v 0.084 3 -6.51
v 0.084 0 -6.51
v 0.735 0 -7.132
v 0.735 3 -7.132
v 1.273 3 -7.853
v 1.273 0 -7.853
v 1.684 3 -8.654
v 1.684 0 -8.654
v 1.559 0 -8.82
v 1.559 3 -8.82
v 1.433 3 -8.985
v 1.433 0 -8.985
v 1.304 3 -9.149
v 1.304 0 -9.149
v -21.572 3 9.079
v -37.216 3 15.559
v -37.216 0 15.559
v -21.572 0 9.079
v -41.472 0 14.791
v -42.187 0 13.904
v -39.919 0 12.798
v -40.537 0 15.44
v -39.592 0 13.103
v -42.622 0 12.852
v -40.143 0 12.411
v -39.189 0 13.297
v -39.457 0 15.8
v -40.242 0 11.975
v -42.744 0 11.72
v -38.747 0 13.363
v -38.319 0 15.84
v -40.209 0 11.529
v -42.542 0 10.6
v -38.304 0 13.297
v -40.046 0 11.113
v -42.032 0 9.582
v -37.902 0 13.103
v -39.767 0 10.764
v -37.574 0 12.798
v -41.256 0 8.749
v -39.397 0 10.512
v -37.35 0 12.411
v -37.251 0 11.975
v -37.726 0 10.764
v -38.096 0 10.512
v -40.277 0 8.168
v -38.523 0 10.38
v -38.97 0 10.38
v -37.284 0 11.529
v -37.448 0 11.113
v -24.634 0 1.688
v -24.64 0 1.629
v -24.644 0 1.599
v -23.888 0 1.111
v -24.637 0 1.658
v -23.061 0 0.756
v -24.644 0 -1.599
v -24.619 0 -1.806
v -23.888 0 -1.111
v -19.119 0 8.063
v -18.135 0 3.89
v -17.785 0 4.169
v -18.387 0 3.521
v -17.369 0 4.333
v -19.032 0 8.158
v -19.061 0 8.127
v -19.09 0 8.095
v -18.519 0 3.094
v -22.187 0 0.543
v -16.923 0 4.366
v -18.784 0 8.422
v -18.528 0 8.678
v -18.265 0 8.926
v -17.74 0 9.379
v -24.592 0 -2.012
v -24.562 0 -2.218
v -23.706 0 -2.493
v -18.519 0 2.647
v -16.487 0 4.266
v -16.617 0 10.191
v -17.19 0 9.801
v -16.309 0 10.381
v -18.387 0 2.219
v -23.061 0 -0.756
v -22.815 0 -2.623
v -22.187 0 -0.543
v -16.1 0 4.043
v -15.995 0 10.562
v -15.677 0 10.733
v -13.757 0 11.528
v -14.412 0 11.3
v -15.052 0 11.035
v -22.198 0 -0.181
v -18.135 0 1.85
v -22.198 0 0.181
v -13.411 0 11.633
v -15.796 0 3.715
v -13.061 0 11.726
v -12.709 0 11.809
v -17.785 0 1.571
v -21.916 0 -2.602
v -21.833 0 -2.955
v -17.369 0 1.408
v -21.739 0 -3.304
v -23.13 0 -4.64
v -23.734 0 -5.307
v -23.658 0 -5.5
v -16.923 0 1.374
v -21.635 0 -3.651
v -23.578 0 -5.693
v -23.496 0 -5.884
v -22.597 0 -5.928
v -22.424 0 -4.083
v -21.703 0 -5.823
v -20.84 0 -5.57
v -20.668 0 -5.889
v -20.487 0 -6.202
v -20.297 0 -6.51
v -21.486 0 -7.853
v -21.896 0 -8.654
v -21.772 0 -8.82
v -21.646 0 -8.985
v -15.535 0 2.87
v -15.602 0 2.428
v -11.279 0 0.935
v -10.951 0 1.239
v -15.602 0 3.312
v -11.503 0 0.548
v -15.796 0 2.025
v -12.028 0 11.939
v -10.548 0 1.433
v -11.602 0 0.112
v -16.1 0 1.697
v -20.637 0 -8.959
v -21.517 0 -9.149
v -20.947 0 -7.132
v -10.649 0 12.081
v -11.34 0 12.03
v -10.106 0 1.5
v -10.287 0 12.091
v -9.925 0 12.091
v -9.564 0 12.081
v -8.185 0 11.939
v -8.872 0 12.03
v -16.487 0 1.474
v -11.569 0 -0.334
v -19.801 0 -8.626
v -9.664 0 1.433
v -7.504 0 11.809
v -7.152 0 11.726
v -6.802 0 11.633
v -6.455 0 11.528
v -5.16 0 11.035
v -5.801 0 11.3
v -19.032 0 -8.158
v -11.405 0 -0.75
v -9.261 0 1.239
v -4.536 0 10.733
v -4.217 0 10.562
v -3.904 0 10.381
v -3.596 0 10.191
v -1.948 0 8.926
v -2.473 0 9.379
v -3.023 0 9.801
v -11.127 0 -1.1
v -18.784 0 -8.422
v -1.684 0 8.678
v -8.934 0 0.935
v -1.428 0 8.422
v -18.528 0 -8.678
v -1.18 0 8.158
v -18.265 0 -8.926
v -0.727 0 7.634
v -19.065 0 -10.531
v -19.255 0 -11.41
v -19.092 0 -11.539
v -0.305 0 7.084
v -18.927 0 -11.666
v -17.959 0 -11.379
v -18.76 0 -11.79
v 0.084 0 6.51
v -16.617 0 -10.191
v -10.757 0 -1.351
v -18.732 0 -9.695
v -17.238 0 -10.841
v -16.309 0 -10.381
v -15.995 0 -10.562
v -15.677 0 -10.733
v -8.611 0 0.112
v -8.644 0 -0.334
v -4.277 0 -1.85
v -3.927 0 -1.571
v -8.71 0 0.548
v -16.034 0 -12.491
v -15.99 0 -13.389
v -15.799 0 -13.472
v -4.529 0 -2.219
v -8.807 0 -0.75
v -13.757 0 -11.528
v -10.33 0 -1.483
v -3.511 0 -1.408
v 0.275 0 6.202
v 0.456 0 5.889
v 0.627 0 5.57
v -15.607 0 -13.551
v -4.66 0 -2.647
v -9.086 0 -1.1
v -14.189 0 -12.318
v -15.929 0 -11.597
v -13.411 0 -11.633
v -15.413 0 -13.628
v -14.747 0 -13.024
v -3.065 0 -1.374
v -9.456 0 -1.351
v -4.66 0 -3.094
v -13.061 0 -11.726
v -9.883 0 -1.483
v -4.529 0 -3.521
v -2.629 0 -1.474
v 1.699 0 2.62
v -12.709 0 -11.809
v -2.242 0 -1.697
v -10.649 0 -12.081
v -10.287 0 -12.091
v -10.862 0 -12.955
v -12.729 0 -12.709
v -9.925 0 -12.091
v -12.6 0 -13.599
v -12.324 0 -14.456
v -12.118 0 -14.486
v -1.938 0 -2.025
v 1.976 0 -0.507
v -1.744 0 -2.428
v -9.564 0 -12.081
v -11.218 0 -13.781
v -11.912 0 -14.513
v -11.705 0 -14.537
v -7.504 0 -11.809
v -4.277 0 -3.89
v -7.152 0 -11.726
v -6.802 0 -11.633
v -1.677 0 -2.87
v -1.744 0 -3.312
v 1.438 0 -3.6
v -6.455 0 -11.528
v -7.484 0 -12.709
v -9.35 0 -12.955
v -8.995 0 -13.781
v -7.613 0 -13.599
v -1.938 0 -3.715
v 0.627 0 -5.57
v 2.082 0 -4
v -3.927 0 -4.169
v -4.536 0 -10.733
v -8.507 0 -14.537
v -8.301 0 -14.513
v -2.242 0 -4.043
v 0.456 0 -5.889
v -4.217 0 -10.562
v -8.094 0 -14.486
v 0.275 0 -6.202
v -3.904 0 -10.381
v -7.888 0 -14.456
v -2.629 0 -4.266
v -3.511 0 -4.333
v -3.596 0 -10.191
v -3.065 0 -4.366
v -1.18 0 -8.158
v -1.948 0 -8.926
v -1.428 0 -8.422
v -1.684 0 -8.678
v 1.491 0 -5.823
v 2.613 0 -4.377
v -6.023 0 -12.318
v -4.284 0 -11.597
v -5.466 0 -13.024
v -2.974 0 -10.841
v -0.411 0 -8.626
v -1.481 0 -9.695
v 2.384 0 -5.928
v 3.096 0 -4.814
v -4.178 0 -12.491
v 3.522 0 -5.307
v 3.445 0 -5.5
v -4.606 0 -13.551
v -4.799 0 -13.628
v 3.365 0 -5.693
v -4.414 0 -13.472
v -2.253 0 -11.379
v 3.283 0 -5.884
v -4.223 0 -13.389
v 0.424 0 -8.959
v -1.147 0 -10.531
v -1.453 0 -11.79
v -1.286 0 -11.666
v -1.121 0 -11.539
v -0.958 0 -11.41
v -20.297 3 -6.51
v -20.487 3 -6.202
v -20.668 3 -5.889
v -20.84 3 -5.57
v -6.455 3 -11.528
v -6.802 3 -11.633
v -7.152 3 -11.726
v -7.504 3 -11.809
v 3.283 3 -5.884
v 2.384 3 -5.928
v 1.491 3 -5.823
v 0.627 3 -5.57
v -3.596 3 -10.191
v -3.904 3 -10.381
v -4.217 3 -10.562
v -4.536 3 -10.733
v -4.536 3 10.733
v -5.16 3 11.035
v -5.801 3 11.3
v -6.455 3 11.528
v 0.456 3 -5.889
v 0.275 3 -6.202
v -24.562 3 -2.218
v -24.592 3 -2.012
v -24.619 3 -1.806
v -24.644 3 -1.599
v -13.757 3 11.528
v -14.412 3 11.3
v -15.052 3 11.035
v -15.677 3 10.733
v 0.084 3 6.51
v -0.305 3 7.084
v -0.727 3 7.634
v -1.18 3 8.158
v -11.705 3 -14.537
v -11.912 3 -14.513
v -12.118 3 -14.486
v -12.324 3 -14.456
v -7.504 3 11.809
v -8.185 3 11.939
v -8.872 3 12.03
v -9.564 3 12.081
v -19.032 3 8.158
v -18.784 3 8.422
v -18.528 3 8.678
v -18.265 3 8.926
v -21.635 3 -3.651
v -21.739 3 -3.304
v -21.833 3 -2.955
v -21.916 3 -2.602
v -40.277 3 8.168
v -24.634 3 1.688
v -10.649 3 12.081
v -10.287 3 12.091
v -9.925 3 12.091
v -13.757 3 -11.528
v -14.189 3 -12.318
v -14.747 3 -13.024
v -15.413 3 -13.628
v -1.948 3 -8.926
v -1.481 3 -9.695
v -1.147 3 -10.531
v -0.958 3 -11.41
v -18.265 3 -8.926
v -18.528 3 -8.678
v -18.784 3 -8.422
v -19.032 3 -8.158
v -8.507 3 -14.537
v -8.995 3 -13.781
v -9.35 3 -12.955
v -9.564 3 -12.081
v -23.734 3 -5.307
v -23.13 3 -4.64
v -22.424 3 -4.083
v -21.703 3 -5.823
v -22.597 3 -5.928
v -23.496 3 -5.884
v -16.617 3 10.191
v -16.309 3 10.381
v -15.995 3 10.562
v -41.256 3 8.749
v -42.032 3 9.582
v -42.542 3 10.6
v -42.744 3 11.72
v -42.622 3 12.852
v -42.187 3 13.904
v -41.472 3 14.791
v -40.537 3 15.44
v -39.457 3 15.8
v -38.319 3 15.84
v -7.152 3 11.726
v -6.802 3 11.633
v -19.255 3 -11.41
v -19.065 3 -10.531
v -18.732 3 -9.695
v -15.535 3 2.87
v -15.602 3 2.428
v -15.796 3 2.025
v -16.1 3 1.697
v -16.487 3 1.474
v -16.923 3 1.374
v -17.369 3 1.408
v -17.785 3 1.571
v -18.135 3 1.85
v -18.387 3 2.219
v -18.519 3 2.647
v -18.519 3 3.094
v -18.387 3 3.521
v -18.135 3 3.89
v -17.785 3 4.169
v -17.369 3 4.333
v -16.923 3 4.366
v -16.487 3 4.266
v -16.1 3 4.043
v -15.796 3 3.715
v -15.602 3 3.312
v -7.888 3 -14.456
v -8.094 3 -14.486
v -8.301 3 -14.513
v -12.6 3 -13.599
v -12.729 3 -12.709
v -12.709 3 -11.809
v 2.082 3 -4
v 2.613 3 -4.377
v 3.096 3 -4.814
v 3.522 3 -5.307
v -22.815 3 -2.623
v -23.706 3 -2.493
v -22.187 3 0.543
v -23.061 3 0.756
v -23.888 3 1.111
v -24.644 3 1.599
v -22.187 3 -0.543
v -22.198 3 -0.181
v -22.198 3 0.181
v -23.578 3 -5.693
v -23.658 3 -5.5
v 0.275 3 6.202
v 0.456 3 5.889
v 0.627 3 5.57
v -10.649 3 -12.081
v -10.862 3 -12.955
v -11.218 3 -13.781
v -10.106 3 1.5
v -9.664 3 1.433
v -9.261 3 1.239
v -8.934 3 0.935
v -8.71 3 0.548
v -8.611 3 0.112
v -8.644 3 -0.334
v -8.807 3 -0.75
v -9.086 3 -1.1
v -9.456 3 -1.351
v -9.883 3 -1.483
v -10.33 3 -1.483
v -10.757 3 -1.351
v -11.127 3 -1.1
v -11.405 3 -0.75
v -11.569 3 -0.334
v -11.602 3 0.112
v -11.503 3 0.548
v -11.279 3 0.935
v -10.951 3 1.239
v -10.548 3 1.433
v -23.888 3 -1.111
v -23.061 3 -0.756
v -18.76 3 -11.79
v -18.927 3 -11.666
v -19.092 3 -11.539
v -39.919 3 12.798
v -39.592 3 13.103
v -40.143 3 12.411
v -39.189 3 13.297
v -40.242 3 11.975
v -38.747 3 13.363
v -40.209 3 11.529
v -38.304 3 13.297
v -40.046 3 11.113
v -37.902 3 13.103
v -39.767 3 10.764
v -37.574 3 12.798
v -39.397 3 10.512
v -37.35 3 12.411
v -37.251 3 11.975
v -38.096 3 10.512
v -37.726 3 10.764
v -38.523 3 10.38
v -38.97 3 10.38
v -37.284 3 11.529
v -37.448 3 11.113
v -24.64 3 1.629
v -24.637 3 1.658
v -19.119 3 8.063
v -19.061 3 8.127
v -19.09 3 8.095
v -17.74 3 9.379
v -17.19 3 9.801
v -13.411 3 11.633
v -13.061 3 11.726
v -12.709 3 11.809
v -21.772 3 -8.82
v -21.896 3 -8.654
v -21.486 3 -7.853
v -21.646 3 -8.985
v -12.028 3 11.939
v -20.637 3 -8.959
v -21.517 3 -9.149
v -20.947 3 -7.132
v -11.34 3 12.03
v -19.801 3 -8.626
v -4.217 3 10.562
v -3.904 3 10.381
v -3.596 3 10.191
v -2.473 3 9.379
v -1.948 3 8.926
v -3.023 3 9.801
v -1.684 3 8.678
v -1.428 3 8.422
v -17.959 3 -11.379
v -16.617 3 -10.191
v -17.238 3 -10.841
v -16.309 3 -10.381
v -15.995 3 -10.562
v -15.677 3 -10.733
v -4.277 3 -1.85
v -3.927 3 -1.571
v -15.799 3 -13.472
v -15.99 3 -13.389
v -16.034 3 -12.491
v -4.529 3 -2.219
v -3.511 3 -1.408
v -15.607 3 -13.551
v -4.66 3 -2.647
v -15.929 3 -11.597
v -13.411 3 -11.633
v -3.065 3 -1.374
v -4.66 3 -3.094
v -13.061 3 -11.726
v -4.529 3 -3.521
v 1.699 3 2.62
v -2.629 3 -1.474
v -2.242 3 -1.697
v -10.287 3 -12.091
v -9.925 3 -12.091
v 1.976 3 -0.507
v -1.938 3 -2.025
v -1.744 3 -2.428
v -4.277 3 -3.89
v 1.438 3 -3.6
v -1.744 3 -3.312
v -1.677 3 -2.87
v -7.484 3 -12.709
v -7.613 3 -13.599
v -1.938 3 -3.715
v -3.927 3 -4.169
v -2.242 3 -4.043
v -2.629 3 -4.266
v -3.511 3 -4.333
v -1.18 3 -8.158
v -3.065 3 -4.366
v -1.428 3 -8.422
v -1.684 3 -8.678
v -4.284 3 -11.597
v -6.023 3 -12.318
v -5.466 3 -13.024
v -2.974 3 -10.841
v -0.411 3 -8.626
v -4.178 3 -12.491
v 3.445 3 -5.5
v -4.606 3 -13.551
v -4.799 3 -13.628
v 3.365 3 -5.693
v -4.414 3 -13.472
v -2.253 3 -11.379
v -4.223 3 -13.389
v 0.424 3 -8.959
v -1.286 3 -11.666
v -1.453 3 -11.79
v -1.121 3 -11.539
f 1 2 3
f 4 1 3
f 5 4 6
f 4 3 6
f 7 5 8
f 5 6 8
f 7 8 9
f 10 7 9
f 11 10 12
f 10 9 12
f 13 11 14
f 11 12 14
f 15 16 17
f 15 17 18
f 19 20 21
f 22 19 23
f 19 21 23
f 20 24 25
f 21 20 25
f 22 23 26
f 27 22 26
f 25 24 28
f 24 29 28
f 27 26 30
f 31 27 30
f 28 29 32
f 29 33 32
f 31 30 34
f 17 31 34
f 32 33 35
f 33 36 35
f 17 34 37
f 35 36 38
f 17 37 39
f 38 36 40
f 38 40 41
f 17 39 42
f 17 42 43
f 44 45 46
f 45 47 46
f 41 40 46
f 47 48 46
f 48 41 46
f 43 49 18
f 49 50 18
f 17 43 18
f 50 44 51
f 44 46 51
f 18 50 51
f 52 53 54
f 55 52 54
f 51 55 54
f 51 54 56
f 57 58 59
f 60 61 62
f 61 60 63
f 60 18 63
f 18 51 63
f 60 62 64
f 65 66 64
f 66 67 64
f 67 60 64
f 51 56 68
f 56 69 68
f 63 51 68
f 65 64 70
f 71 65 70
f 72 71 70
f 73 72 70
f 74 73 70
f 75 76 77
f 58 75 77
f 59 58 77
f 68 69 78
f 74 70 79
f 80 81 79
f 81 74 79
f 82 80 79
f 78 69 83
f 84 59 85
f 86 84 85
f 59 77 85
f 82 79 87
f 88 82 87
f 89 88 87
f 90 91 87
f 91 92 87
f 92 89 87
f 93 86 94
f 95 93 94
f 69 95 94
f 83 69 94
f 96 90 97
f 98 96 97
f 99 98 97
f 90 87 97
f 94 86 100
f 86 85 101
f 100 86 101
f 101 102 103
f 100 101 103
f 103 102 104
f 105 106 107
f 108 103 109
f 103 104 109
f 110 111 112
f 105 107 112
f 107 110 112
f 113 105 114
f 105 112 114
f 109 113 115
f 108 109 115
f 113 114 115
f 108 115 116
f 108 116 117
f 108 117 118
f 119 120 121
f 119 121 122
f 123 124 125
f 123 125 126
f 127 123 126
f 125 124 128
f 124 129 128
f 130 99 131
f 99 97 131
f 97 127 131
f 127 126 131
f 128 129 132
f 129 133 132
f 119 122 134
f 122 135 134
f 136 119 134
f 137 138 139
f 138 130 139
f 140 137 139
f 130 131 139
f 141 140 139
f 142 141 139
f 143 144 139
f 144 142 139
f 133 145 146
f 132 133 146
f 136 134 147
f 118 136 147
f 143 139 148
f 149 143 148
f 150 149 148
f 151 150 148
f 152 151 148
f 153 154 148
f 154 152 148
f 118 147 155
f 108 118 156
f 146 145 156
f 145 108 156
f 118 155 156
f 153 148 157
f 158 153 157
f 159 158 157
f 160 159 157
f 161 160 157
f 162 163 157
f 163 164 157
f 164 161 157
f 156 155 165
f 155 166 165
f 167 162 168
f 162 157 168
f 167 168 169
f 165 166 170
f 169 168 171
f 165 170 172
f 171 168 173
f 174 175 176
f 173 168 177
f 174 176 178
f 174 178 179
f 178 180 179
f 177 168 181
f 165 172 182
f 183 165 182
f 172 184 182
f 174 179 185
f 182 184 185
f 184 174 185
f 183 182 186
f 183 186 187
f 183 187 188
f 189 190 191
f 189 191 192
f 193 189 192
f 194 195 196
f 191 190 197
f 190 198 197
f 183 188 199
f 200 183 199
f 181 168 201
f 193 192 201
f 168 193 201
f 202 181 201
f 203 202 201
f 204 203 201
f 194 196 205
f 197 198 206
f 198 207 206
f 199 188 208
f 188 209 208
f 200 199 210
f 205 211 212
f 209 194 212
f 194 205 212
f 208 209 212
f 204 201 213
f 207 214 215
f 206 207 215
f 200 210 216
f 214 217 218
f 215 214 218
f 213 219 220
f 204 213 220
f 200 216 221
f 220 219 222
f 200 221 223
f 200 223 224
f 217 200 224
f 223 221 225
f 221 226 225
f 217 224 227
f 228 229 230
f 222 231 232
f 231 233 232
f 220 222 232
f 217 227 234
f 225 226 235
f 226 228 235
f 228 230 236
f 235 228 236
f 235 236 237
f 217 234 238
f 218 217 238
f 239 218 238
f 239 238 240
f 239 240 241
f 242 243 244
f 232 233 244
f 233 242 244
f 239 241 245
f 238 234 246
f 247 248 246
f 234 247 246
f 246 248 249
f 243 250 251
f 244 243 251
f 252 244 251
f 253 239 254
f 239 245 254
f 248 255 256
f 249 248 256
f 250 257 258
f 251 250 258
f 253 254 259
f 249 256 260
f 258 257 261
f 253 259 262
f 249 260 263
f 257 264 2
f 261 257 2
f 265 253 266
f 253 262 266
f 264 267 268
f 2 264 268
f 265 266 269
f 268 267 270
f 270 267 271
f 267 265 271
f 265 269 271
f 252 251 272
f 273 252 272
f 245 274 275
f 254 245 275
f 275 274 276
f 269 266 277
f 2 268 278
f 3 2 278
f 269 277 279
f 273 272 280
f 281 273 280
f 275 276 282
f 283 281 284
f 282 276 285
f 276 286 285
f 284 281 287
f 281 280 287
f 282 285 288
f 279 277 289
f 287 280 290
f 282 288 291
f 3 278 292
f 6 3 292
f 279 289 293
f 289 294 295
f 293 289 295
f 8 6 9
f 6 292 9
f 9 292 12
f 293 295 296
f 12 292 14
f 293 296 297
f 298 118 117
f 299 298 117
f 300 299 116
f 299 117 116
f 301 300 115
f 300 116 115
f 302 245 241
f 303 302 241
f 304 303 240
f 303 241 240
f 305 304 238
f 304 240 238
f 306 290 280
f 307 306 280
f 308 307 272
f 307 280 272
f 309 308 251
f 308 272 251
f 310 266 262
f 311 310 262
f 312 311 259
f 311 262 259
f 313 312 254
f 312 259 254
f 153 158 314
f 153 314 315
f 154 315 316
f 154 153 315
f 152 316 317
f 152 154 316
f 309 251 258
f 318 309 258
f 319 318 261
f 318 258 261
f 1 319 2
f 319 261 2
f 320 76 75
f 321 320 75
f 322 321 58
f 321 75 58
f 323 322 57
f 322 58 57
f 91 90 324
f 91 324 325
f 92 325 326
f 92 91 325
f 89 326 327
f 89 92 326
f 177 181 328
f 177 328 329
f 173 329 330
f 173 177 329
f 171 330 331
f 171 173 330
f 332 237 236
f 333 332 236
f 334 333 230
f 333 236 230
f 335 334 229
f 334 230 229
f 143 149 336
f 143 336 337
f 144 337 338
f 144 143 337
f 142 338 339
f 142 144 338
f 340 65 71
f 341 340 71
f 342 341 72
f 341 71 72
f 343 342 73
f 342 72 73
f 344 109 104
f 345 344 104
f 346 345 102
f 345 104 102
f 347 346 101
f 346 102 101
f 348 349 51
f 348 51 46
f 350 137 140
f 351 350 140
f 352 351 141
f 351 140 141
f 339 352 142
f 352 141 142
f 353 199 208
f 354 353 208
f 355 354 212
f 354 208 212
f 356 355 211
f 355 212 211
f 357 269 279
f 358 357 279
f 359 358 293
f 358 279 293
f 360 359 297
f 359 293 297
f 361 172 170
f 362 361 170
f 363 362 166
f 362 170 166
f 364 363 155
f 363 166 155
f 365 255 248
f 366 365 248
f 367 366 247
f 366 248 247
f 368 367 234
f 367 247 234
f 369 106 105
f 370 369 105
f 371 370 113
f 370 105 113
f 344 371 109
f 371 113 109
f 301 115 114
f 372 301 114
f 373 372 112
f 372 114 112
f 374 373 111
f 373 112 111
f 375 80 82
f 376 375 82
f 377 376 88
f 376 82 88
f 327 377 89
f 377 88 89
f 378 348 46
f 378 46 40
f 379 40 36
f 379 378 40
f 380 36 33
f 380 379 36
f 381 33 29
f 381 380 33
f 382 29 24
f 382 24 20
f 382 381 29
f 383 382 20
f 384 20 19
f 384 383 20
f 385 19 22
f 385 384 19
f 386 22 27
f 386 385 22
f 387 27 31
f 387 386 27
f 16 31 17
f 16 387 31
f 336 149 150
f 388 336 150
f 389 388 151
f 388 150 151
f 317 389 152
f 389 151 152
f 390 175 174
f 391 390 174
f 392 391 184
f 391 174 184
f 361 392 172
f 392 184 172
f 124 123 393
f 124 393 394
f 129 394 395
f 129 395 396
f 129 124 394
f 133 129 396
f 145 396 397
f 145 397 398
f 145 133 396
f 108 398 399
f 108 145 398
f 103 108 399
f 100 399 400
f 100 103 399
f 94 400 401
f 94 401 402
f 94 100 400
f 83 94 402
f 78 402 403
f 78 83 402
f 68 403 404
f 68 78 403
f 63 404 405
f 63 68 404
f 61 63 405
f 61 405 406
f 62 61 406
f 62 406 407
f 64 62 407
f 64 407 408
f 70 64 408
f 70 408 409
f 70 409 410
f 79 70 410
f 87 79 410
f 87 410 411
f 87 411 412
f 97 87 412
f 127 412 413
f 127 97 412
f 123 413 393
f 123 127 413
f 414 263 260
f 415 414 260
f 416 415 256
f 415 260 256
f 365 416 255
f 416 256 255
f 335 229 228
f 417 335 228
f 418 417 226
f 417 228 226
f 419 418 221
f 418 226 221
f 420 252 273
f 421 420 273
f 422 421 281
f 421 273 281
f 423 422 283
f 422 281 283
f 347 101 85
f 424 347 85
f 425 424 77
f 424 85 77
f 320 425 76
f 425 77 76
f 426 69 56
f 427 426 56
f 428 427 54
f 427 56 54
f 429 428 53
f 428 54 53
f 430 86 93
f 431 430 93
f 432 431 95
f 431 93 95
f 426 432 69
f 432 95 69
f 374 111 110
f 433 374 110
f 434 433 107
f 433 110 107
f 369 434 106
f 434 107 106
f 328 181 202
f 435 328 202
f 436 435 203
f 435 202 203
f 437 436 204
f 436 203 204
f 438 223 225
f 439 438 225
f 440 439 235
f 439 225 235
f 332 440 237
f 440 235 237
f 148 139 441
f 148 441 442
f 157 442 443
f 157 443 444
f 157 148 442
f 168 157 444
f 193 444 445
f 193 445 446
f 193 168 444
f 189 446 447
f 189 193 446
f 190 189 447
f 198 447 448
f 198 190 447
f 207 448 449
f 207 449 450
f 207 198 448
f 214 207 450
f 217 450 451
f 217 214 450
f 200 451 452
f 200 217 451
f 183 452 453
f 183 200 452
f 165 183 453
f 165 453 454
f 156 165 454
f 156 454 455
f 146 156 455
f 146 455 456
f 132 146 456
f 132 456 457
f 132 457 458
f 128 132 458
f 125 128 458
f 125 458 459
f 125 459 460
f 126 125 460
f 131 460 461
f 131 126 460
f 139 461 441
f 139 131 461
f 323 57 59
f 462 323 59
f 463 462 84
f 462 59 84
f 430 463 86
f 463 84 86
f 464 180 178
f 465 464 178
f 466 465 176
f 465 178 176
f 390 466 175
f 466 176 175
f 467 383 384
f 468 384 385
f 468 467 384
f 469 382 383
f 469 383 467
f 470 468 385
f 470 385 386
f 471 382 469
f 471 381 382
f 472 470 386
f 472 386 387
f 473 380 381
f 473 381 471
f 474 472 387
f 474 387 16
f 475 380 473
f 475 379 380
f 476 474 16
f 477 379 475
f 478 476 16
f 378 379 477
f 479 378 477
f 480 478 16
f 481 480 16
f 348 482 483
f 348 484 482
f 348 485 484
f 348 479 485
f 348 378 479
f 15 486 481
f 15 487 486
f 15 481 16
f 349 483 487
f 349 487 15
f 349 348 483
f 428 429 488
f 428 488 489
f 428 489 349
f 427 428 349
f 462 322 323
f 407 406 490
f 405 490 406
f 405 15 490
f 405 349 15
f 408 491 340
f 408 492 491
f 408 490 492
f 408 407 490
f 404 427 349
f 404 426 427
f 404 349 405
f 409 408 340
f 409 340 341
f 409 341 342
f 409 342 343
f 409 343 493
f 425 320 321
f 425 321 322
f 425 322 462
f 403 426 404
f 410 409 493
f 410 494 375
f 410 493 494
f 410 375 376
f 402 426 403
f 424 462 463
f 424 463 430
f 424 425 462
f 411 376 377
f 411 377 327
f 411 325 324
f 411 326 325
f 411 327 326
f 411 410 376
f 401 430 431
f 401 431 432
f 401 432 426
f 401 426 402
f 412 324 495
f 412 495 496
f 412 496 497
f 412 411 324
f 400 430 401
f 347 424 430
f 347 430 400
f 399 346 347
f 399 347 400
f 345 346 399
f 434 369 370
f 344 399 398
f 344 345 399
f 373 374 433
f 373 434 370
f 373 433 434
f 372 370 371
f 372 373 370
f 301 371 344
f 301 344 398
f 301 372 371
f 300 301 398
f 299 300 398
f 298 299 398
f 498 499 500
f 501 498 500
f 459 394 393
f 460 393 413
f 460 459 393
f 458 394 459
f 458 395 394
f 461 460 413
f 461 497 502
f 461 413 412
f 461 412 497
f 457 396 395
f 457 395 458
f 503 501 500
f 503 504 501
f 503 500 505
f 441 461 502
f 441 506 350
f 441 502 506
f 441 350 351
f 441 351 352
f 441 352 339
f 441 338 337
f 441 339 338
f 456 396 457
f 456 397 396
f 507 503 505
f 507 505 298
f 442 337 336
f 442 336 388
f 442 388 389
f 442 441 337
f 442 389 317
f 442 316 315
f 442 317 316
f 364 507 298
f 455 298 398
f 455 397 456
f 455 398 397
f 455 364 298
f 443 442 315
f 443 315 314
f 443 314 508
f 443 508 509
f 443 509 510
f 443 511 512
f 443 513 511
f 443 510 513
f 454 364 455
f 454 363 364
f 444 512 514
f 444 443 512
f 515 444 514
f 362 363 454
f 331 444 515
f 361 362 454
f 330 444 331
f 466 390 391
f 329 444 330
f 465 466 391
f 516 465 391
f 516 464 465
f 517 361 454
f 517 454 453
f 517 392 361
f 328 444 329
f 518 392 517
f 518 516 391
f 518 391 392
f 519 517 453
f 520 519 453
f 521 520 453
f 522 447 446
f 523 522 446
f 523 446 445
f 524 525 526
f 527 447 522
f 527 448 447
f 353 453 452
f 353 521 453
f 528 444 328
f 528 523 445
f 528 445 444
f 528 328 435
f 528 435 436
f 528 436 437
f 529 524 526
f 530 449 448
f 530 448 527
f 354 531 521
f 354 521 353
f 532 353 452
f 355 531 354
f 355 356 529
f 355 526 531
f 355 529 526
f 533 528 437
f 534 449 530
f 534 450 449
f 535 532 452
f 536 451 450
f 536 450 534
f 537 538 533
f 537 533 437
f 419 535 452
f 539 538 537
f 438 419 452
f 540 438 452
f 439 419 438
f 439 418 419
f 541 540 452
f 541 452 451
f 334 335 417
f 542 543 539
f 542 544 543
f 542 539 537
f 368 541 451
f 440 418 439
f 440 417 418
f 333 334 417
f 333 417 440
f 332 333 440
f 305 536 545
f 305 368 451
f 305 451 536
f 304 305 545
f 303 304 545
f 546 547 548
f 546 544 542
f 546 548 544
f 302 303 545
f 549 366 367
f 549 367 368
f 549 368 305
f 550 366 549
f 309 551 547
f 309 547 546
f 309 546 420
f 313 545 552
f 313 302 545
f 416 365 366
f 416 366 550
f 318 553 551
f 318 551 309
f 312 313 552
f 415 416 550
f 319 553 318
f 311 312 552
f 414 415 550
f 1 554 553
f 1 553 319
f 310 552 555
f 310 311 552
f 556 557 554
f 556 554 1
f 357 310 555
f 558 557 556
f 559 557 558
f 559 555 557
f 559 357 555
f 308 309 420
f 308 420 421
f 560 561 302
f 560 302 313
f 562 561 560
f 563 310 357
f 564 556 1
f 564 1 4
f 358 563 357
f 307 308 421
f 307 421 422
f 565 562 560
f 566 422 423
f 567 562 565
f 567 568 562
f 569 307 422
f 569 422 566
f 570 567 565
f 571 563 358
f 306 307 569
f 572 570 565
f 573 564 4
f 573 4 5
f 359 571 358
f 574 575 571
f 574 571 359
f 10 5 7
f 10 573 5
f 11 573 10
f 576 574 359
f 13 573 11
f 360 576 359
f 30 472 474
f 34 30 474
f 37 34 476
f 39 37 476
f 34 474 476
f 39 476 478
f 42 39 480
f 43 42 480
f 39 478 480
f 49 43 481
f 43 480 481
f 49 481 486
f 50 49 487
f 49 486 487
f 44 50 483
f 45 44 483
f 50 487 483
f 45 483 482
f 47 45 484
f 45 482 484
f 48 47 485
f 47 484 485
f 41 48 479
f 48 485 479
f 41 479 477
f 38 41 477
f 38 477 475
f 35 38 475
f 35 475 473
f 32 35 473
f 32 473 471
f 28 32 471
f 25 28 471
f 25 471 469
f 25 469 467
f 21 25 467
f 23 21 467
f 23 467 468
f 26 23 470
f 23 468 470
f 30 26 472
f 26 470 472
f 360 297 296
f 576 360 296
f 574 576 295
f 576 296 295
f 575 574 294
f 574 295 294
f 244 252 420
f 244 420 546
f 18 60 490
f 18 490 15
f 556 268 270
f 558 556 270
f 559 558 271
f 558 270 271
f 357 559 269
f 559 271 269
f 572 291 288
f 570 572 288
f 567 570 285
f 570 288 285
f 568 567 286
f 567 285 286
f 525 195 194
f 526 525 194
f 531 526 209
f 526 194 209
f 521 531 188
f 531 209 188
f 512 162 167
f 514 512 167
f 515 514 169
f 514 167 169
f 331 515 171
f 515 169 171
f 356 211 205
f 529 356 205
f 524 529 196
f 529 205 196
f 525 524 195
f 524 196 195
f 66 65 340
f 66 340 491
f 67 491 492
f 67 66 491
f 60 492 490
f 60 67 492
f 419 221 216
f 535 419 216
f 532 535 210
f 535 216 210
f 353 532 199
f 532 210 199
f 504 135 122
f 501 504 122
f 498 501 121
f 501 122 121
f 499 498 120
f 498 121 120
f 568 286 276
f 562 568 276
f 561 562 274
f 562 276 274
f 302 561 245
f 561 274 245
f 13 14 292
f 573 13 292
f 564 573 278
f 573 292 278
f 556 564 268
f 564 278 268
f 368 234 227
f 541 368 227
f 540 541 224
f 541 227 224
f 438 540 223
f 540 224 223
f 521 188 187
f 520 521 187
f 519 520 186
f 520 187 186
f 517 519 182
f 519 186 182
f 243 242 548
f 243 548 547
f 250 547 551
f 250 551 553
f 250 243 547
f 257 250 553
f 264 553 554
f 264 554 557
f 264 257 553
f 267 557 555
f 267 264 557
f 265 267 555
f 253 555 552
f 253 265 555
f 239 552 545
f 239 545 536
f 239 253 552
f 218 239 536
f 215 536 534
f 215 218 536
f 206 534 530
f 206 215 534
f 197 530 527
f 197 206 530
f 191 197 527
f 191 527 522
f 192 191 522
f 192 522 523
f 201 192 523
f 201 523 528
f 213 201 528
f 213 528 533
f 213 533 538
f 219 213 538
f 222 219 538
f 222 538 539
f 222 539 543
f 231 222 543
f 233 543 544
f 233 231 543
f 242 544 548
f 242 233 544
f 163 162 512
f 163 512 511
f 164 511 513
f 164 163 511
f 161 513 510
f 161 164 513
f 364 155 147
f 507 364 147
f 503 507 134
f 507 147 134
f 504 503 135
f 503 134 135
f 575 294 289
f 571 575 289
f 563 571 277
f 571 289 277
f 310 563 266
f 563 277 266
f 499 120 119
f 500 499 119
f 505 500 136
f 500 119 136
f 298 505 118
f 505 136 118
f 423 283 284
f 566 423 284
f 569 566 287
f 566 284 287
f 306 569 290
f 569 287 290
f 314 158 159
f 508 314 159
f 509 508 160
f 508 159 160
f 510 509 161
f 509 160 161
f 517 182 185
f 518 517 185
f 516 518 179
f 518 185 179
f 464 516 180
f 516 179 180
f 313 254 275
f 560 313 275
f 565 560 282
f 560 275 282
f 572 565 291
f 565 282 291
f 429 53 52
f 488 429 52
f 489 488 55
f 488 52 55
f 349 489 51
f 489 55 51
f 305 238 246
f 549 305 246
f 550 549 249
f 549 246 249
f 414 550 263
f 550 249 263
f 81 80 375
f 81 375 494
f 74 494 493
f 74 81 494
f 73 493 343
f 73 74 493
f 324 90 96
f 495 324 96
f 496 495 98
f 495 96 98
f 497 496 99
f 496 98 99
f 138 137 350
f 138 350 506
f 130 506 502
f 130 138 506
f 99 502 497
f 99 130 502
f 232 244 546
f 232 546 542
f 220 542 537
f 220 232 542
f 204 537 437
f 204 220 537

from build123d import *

# Parameters (mm, degrees)
SKETCH1_R              = 1.5
BOSS_EXTRUDE1_DEPTH    = 3
SKETCH3_R              = 1.5
BOSS_EXTRUDE2_DEPTH    = 3
CUT_EXTRUDE1_OUTLINE_R = 1.5
CUT_EXTRUDE1_DEPTH     = 3


# Read off the part's stored shape, not the designer's step: Cut-Extrude1
with BuildPart() as part:
    # Sketch1 → Boss-Extrude1 (new body)
    with BuildSketch(Plane(origin=(0, 0, 0), x_dir=(1, 0, 0), z_dir=(0, 1, 0))):
        with BuildLine():
            Line((20.643657446, 4), (2.081641936, 4))
            ThreePointArc((2.081641936, 4), (2.861028333, 4.588201733), (3.521749436, 5.30713988))
            ThreePointArc((3.521749436, 5.30713988), (3.405395609, 5.596745198), (3.282888305, 5.883801663))
            ThreePointArc((3.282888305, 5.883801663), (1.93527598, 5.894040025), (0.627094961, 5.57027124))
            ThreePointArc((0.627094961, 5.57027124), (0.366286148, 6.046375), (0.084372603, 6.510293938))
            ThreePointArc((0.084372603, 6.510293938), (1.018855105, 7.48132754), (1.683794586, 8.65351323))
            ThreePointArc((1.683794586, 8.65351323), (1.496450048, 8.903135899), (1.303821399, 9.148703928))
            ThreePointArc((1.303821399, 9.148703928), (-0.000522033, 8.809805691), (-1.180330337, 8.158486898))
            ThreePointArc((-1.180330337, 8.158486898), (-1.555477026, 8.550865528), (-1.947855656, 8.926012217))
            ThreePointArc((-1.947855656, 8.926012217), (-1.296536862, 10.105820521), (-0.957638625, 11.410163953))
            ThreePointArc((-0.957638625, 11.410163953), (-1.203206655, 11.602792602), (-1.452829324, 11.79013714))
            ThreePointArc((-1.452829324, 11.79013714), (-2.625015014, 11.125197659), (-3.596048616, 10.190715157))
            ThreePointArc((-3.596048616, 10.190715157), (-4.059967554, 10.472628702), (-4.536071314, 10.733437515))
            ThreePointArc((-4.536071314, 10.733437515), (-4.212302529, 12.041618533), (-4.222540891, 13.389230859))
            ThreePointArc((-4.222540891, 13.389230859), (-4.509597355, 13.511738163), (-4.799202674, 13.62809199))
            ThreePointArc((-4.799202674, 13.62809199), (-5.759348103, 12.682425791), (-6.455432668, 11.528463019))
            ThreePointArc((-6.455432668, 11.528463019), (-6.976508546, 11.680699536), (-7.503891752, 11.809396783))
            ThreePointArc((-7.503891752, 11.809396783), (-7.529737283, 13.156800143), (-7.888414517, 14.455843809))
            ThreePointArc((-7.888414517, 14.455843809), (-8.197396993, 14.499881098), (-8.507248835, 14.537314892))
            ThreePointArc((-8.507248835, 14.537314892), (-9.18992168, 13.375367565), (-9.563620196, 12.080565177))
            ThreePointArc((-9.563620196, 12.080565177), (-10.106342554, 12.09275), (-10.649064912, 12.080565177))
            ThreePointArc((-10.649064912, 12.080565177), (-11.022763428, 13.375367565), (-11.705436272, 14.537314892))
            ThreePointArc((-11.705436272, 14.537314892), (-12.015288115, 14.499881098), (-12.324270591, 14.455843809))
            ThreePointArc((-12.324270591, 14.455843809), (-12.682947825, 13.156800143), (-12.708793355, 11.809396783))
            ThreePointArc((-12.708793355, 11.809396783), (-13.236176561, 11.680699536), (-13.757252439, 11.528463019))
            ThreePointArc((-13.757252439, 11.528463019), (-14.453337005, 12.682425791), (-15.413482434, 13.62809199))
            ThreePointArc((-15.413482434, 13.62809199), (-15.703087752, 13.511738163), (-15.990144217, 13.389230859))
            ThreePointArc((-15.990144217, 13.389230859), (-16.000382579, 12.041618533), (-15.676613793, 10.733437515))
            ThreePointArc((-15.676613793, 10.733437515), (-16.152717554, 10.472628702), (-16.616636492, 10.190715157))
            ThreePointArc((-16.616636492, 10.190715157), (-17.587670094, 11.125197659), (-18.759855783, 11.79013714))
            ThreePointArc((-18.759855783, 11.79013714), (-19.009478453, 11.602792602), (-19.255046482, 11.410163953))
            ThreePointArc((-19.255046482, 11.410163953), (-18.916148245, 10.105820521), (-18.264829452, 8.926012217))
            ThreePointArc((-18.264829452, 8.926012217), (-18.657208082, 8.550865528), (-19.032354771, 8.158486898))
            ThreePointArc((-19.032354771, 8.158486898), (-20.212163074, 8.809805691), (-21.516506507, 9.148703928))
            ThreePointArc((-21.516506507, 9.148703928), (-21.709135156, 8.903135899), (-21.896479694, 8.65351323))
            ThreePointArc((-21.896479694, 8.65351323), (-21.231540213, 7.48132754), (-20.297057711, 6.510293938))
            ThreePointArc((-20.297057711, 6.510293938), (-20.578971255, 6.046375), (-20.839780068, 5.57027124))
            ThreePointArc((-20.839780068, 5.57027124), (-22.147961087, 5.894040025), (-23.495573413, 5.883801663))
            ThreePointArc((-23.495573413, 5.883801663), (-23.618080717, 5.596745198), (-23.734434544, 5.30713988))
            ThreePointArc((-23.734434544, 5.30713988), (-22.788768345, 4.346994451), (-21.634805572, 3.650909885))
            ThreePointArc((-21.634805572, 3.650909885), (-21.78704209, 3.129834008), (-21.915739337, 2.602450802))
            ThreePointArc((-21.915739337, 2.602450802), (-23.263142697, 2.576605271), (-24.562186363, 2.217928037))
            ThreePointArc((-24.562186363, 2.217928037), (-24.606223651, 1.908945561), (-24.643657446, 1.599093719))
            ThreePointArc((-24.643657446, 1.599093719), (-23.481710119, 0.916420874), (-22.186907731, 0.542722358))
            ThreePointArc((-22.186907731, 0.542722358), (-22.199092554, 0), (-22.186907731, -0.542722358))
            ThreePointArc((-22.186907731, -0.542722358), (-23.481710119, -0.916420874), (-24.643657446, -1.599093719))
            ThreePointArc((-24.643657446, -1.599093719), (-24.606223651, -1.908945561), (-24.562186363, -2.217928037))
            ThreePointArc((-24.562186363, -2.217928037), (-23.263142697, -2.576605271), (-21.915739337, -2.602450802))
            ThreePointArc((-21.915739337, -2.602450802), (-21.78704209, -3.129834008), (-21.634805572, -3.650909885))
            ThreePointArc((-21.634805572, -3.650909885), (-22.788768345, -4.346994451), (-23.734434544, -5.30713988))
            ThreePointArc((-23.734434544, -5.30713988), (-23.618080717, -5.596745198), (-23.495573413, -5.883801663))
            ThreePointArc((-23.495573413, -5.883801663), (-22.147961087, -5.894040025), (-20.839780068, -5.57027124))
            ThreePointArc((-20.839780068, -5.57027124), (-20.578971255, -6.046375), (-20.297057711, -6.510293938))
            ThreePointArc((-20.297057711, -6.510293938), (-21.231540213, -7.48132754), (-21.896479694, -8.65351323))
            ThreePointArc((-21.896479694, -8.65351323), (-21.709135156, -8.903135899), (-21.516506507, -9.148703928))
            ThreePointArc((-21.516506507, -9.148703928), (-20.212163074, -8.809805691), (-19.032354771, -8.158486898))
            ThreePointArc((-19.032354771, -8.158486898), (-18.657208082, -8.550865528), (-18.264829452, -8.926012217))
            ThreePointArc((-18.264829452, -8.926012217), (-18.916148245, -10.105820521), (-19.255046482, -11.410163953))
            ThreePointArc((-19.255046482, -11.410163953), (-19.009478453, -11.602792602), (-18.759855783, -11.79013714))
            ThreePointArc((-18.759855783, -11.79013714), (-17.587670094, -11.125197659), (-16.616636492, -10.190715157))
            ThreePointArc((-16.616636492, -10.190715157), (-16.152717554, -10.472628702), (-15.676613793, -10.733437515))
            ThreePointArc((-15.676613793, -10.733437515), (-16.000382579, -12.041618533), (-15.990144217, -13.389230859))
            ThreePointArc((-15.990144217, -13.389230859), (-15.703087752, -13.511738163), (-15.413482434, -13.62809199))
            ThreePointArc((-15.413482434, -13.62809199), (-14.453337005, -12.682425791), (-13.757252439, -11.528463019))
            ThreePointArc((-13.757252439, -11.528463019), (-13.236176561, -11.680699536), (-12.708793355, -11.809396783))
            ThreePointArc((-12.708793355, -11.809396783), (-12.682947825, -13.156800143), (-12.324270591, -14.455843809))
            ThreePointArc((-12.324270591, -14.455843809), (-12.015288115, -14.499881098), (-11.705436272, -14.537314892))
            ThreePointArc((-11.705436272, -14.537314892), (-11.022763428, -13.375367565), (-10.649064912, -12.080565177))
            ThreePointArc((-10.649064912, -12.080565177), (-10.106342554, -12.09275), (-9.563620196, -12.080565177))
            ThreePointArc((-9.563620196, -12.080565177), (-9.18992168, -13.375367565), (-8.507248835, -14.537314892))
            ThreePointArc((-8.507248835, -14.537314892), (-8.197396993, -14.499881098), (-7.888414517, -14.455843809))
            ThreePointArc((-7.888414517, -14.455843809), (-7.529737283, -13.156800143), (-7.503891752, -11.809396783))
            ThreePointArc((-7.503891752, -11.809396783), (-6.976508546, -11.680699536), (-6.455432668, -11.528463019))
            ThreePointArc((-6.455432668, -11.528463019), (-5.759348103, -12.682425791), (-4.799202674, -13.62809199))
            ThreePointArc((-4.799202674, -13.62809199), (-4.509597355, -13.511738163), (-4.222540891, -13.389230859))
            ThreePointArc((-4.222540891, -13.389230859), (-4.212302529, -12.041618533), (-4.536071314, -10.733437515))
            ThreePointArc((-4.536071314, -10.733437515), (-4.059967554, -10.472628702), (-3.596048616, -10.190715157))
            ThreePointArc((-3.596048616, -10.190715157), (-2.625015014, -11.125197659), (-1.452829324, -11.79013714))
            ThreePointArc((-1.452829324, -11.79013714), (-1.203206655, -11.602792602), (-0.957638625, -11.410163953))
            ThreePointArc((-0.957638625, -11.410163953), (-1.296536862, -10.105820521), (-1.947855656, -8.926012217))
            ThreePointArc((-1.947855656, -8.926012217), (-1.555477026, -8.550865528), (-1.180330337, -8.158486898))
            ThreePointArc((-1.180330337, -8.158486898), (-0.000522033, -8.809805691), (1.303821399, -9.148703928))
            ThreePointArc((1.303821399, -9.148703928), (1.496450048, -8.903135899), (1.683794586, -8.65351323))
            ThreePointArc((1.683794586, -8.65351323), (1.018855105, -7.48132754), (0.084372603, -6.510293938))
            ThreePointArc((0.084372603, -6.510293938), (0.366286148, -6.046375), (0.627094961, -5.57027124))
            ThreePointArc((0.627094961, -5.57027124), (1.93527598, -5.894040025), (3.282888305, -5.883801663))
            ThreePointArc((3.282888305, -5.883801663), (3.405395609, -5.596745198), (3.521749436, -5.30713988))
            ThreePointArc((3.521749436, -5.30713988), (2.861028333, -4.588201733), (2.081641936, -4))
            Line((2.081641936, -4), (20.643657446, -4))
            ThreePointArc((20.643657446, -4), (24.643657446, 0), (20.643657446, 4))
        make_face()
        with Locations(Location((-10.106342554, 0, 0), (0, 0, 270))):
            Circle(SKETCH1_R, mode=Mode.SUBTRACT)
        with Locations(Location((20.643657446, 0, 0), (0, 0, 270))):
            Circle(SKETCH1_R, mode=Mode.SUBTRACT)
    extrude(amount=BOSS_EXTRUDE1_DEPTH)

    # Sketch3 → Boss-Extrude2 (add)
    with BuildSketch(Plane(origin=(0, 3, 0), x_dir=(1, 0, 0), z_dir=(0, 1, 0))):
        with BuildLine():
            Line((-14.106342554, 0), (-20.558846273, 0))
            Line((-20.558846273, 0), (-40.277341791, -8.167668273))
            ThreePointArc((-40.277341791, -8.167668273), (-42.442126192, -13.393920133), (-37.215874332, -15.558704533))
            Line((-37.215874332, -15.558704533), (-8.575608824, -3.69551813))
            ThreePointArc((-8.575608824, -3.69551813), (-12.328623486, -3.325878449), (-14.106342554, 0))
        make_face()
        with Locations(Location((-38.746608062, -11.863186403, 0), (0, 0, 270))):
            Circle(SKETCH3_R, mode=Mode.SUBTRACT)
    extrude(amount=-BOSS_EXTRUDE2_DEPTH)

    # Cut-Extrude1 outline → Cut-Extrude1 (cut)
    # profile 1 of 11: a face of its own
    with BuildSketch(Plane(origin=(0, 0, 0), x_dir=(1, 0, 0), z_dir=(0, 1, 0))):
        with BuildLine():
            Line((2.081641936, 4), (1.43808022, 3.600125745))
            ThreePointArc((1.43808022, 3.600125745), (1.939395695, -1.065266441), (0.627094961, -5.57027124))
            ThreePointArc((0.627094961, -5.57027124), (1.93527598, -5.894040025), (3.282888305, -5.883801663))
            ThreePointArc((3.282888305, -5.883801663), (3.405395609, -5.596745198), (3.521749436, -5.30713988))
            ThreePointArc((3.521749436, -5.30713988), (2.861028333, -4.588201733), (2.081641936, -4))
            Line((2.081641936, -4), (20.643657446, -4))
            ThreePointArc((20.643657446, -4), (24.643657446, 0), (20.643657446, 4))
            Line((20.643657446, 4), (2.081641936, 4))
        make_face()
        with Locations((20.643657446, 0)):
            Circle(CUT_EXTRUDE1_OUTLINE_R, mode=Mode.SUBTRACT)
    # profile 2 of 11: a face of its own
    with BuildSketch(Plane(origin=(0, 0, 0), x_dir=(1, 0, 0), z_dir=(0, 1, 0))):
        with BuildLine():
            ThreePointArc((-21.516506507, -9.148703928), (-20.212163075, -8.809805691), (-19.032354771, -8.158486898))
            ThreePointArc((-19.032354771, -8.158486898), (-19.075783612, -8.110716964), (-19.118956803, -8.062715855))
            Line((-19.118956803, -8.062715855), (-21.572155055, -9.078863843))
            ThreePointArc((-21.572155055, -9.078863843), (-21.544384086, -9.113826359), (-21.516506507, -9.148703928))
        make_face()
    # profile 3 of 11: a face of its own
    with BuildSketch(Plane(origin=(0, 0, 0), x_dir=(1, 0, 0), z_dir=(0, 1, 0))):
        with BuildLine():
            ThreePointArc((-18.759855783, -11.79013714), (-17.587670094, -11.125197659), (-16.616636492, -10.190715157))
            ThreePointArc((-16.616636492, -10.190715157), (-17.467942325, -9.593823606), (-18.264829452, -8.926012217))
            ThreePointArc((-18.264829452, -8.926012217), (-18.916148245, -10.105820521), (-19.255046482, -11.410163953))
            ThreePointArc((-19.255046482, -11.410163953), (-19.009478453, -11.602792602), (-18.759855783, -11.79013714))
        make_face()
    # profile 4 of 11: a face of its own
    with BuildSketch(Plane(origin=(0, 0, 0), x_dir=(1, 0, 0), z_dir=(0, 1, 0))):
        with BuildLine():
            ThreePointArc((-15.413482434, -13.62809199), (-14.453337005, -12.682425791), (-13.757252439, -11.528463019))
            ThreePointArc((-13.757252439, -11.528463019), (-14.73403763, -11.172244217), (-15.676613793, -10.733437515))
            ThreePointArc((-15.676613793, -10.733437515), (-16.000382579, -12.041618533), (-15.990144217, -13.389230859))
            ThreePointArc((-15.990144217, -13.389230859), (-15.703087752, -13.511738163), (-15.413482434, -13.62809199))
        make_face()
    # profile 5 of 11: a face of its own
    with BuildSketch(Plane(origin=(0, 0, 0), x_dir=(1, 0, 0), z_dir=(0, 1, 0))):
        with BuildLine():
            ThreePointArc((-11.705436272, -14.537314892), (-11.022763428, -13.375367565), (-10.649064912, -12.080565177))
            ThreePointArc((-10.649064912, -12.080565177), (-11.684763165, -11.989294847), (-12.708793355, -11.809396783))
            ThreePointArc((-12.708793355, -11.809396783), (-12.682947825, -13.156800143), (-12.324270591, -14.455843809))
            ThreePointArc((-12.324270591, -14.455843809), (-12.015288115, -14.499881098), (-11.705436272, -14.537314892))
        make_face()
    # profile 6 of 11: a face of its own
    with BuildSketch(Plane(origin=(0, 0, 0), x_dir=(1, 0, 0), z_dir=(0, 1, 0))):
        with BuildLine():
            ThreePointArc((-7.888414517, -14.455843809), (-7.529737283, -13.156800143), (-7.503891752, -11.809396783))
            ThreePointArc((-7.503891752, -11.809396783), (-8.527921943, -11.989294847), (-9.563620196, -12.080565177))
            ThreePointArc((-9.563620196, -12.080565177), (-9.18992168, -13.375367565), (-8.507248835, -14.537314892))
            ThreePointArc((-8.507248835, -14.537314892), (-8.197396993, -14.499881098), (-7.888414517, -14.455843809))
        make_face()
    # profile 7 of 11: a face of its own
    with BuildSketch(Plane(origin=(0, 0, 0), x_dir=(1, 0, 0), z_dir=(0, 1, 0))):
        with BuildLine():
            ThreePointArc((-4.222540891, -13.389230859), (-4.212302529, -12.041618534), (-4.536071314, -10.733437515))
            ThreePointArc((-4.536071314, -10.733437515), (-5.478647477, -11.172244217), (-6.455432668, -11.528463019))
            ThreePointArc((-6.455432668, -11.528463019), (-5.759348103, -12.682425792), (-4.799202674, -13.62809199))
            ThreePointArc((-4.799202674, -13.62809199), (-4.509597356, -13.511738163), (-4.222540891, -13.389230859))
        make_face()
    # profile 8 of 11: a face of its own
    with BuildSketch(Plane(origin=(0, 0, 0), x_dir=(1, 0, 0), z_dir=(0, 1, 0))):
        with BuildLine():
            ThreePointArc((-0.957638625, -11.410163953), (-1.296536862, -10.105820521), (-1.947855656, -8.926012217))
            ThreePointArc((-1.947855656, -8.926012217), (-2.744742783, -9.593823606), (-3.596048616, -10.190715157))
            ThreePointArc((-3.596048616, -10.190715157), (-2.625015014, -11.125197659), (-1.452829324, -11.79013714))
            ThreePointArc((-1.452829324, -11.79013714), (-1.203206654, -11.602792602), (-0.957638625, -11.410163953))
        make_face()
    # profile 9 of 11: a face of its own
    with BuildSketch(Plane(origin=(0, 0, 0), x_dir=(1, 0, 0), z_dir=(0, 1, 0))):
        with BuildLine():
            ThreePointArc((1.683794586, -8.65351323), (1.018855105, -7.48132754), (0.084372603, -6.510293938))
            ThreePointArc((0.084372603, -6.510293938), (-0.512518948, -7.361599771), (-1.180330337, -8.158486898))
            ThreePointArc((-1.180330337, -8.158486898), (-0.000522033, -8.809805691), (1.303821399, -9.148703928))
            ThreePointArc((1.303821399, -9.148703928), (1.496450048, -8.903135899), (1.683794586, -8.65351323))
        make_face()
    # profile 10 of 11: a face of its own
    with BuildSketch(Plane(origin=(0, 0, 0), x_dir=(1, 0, 0), z_dir=(0, 1, 0))):
        with Locations((-17.035439048, -2.870125743)):
            Circle(CUT_EXTRUDE1_OUTLINE_R)
    # profile 11 of 11: a face of its own
    with BuildSketch(Plane(origin=(0, 0, 0), x_dir=(1, 0, 0), z_dir=(0, 1, 0))):
        with Locations((-3.17724606, 2.870125743)):
            Circle(CUT_EXTRUDE1_OUTLINE_R)
    extrude(amount=CUT_EXTRUDE1_DEPTH, mode=Mode.SUBTRACT)


solid = part.part
